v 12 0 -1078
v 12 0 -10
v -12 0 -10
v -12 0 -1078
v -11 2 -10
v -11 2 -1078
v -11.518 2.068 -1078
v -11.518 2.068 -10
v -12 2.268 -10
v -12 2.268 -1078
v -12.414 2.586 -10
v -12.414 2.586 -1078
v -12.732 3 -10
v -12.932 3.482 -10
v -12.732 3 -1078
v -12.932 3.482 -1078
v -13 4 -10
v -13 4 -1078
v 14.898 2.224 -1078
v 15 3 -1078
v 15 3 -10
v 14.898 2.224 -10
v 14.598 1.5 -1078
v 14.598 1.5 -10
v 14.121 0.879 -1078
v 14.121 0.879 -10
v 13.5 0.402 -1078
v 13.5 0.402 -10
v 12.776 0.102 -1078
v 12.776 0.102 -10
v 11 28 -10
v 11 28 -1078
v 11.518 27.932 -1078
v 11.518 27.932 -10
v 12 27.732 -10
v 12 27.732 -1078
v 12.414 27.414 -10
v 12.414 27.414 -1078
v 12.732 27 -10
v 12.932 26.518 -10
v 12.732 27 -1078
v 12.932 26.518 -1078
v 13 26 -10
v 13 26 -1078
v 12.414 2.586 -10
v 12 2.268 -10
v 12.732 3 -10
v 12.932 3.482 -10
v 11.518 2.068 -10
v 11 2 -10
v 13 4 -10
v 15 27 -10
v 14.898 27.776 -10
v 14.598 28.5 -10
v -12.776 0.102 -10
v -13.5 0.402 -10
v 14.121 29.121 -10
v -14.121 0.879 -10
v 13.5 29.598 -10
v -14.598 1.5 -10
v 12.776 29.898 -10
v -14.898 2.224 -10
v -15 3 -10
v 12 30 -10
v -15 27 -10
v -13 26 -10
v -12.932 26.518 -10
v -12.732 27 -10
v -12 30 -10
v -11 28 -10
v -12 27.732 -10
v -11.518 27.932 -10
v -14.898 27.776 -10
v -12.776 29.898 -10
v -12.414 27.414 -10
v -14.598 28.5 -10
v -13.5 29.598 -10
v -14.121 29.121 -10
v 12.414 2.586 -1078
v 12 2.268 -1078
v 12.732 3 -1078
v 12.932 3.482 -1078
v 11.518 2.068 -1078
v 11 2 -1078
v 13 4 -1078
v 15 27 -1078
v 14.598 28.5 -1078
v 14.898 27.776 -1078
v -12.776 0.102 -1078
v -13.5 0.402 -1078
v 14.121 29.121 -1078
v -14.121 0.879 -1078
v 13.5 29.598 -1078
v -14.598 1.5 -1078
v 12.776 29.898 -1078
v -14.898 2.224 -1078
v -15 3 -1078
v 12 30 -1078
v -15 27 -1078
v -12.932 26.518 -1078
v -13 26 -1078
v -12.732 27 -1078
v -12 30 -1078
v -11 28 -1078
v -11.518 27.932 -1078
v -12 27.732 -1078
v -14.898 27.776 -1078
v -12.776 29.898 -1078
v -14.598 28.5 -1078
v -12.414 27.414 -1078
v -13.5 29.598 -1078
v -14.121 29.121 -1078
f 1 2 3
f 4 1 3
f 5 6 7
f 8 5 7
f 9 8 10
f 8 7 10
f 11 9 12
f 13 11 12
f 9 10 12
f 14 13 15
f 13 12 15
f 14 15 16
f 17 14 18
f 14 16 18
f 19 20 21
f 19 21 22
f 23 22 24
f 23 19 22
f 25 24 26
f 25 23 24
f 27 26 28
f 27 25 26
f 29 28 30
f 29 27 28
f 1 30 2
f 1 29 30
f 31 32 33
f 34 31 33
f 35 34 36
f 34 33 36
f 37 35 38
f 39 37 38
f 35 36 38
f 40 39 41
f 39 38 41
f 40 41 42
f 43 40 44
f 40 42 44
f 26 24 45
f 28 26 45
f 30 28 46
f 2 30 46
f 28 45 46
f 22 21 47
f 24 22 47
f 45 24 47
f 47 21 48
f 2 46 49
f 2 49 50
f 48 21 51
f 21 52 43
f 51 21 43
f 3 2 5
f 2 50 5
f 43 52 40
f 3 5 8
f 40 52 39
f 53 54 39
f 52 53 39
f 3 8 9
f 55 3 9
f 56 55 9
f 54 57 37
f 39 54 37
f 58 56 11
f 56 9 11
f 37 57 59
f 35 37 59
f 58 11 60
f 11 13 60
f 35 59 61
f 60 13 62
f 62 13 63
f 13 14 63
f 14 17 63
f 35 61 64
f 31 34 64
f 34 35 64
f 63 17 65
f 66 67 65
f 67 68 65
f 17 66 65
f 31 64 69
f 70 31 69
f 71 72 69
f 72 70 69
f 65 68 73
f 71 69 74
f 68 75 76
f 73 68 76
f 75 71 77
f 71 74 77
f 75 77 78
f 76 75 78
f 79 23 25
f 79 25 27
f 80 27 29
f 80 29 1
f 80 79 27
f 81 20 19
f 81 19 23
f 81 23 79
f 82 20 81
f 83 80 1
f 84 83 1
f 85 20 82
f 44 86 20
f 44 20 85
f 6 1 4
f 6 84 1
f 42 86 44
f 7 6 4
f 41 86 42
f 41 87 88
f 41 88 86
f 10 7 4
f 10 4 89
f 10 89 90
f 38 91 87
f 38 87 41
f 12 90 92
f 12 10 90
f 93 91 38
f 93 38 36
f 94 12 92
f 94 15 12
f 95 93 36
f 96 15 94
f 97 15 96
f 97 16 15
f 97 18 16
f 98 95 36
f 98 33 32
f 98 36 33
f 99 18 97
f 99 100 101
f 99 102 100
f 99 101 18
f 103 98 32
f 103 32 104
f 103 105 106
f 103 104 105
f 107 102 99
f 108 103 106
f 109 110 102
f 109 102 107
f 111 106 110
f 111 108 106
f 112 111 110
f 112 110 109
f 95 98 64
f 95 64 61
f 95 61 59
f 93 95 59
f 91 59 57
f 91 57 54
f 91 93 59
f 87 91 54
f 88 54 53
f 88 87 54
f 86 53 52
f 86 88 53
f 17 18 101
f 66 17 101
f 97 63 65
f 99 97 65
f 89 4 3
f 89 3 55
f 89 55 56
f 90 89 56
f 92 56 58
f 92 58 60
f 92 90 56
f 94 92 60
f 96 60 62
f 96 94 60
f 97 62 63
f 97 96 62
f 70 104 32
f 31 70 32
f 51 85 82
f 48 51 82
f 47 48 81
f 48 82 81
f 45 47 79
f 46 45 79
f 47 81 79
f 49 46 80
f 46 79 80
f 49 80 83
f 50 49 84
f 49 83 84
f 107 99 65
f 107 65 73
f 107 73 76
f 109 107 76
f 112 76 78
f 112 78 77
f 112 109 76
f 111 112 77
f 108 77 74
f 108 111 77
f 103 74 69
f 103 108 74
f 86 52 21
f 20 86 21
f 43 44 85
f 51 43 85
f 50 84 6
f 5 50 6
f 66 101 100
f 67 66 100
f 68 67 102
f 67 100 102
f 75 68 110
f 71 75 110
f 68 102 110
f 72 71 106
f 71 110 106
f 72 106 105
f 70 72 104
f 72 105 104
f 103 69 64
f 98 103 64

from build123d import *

# Parameters (mm, degrees)
EXTRUDE_1_DEPTH = 534


with BuildPart() as part:
    # Эскиз1 → Бобышка-Вытянуть1 (new body)
    with BuildSketch(Plane.XY.offset(-10)):
        with BuildLine():
            Line((12, 0), (-12, 0))
            ThreePointArc((-12, 0), (-14.121320344, 0.878679656), (-15, 3))
            Line((-15, 3), (-15, 27))
            ThreePointArc((-15, 27), (-14.121320344, 29.121320344), (-12, 30))
            Line((-12, 30), (12, 30))
            ThreePointArc((12, 30), (14.121320344, 29.121320344), (15, 27))
            Line((15, 27), (15, 3))
            ThreePointArc((15, 3), (14.121320344, 0.878679656), (12, 0))
        make_face()
        with BuildLine():
            Line((11, 2), (-11, 2))
            ThreePointArc((-11, 2), (-12.414213562, 2.585786438), (-13, 4))
            Line((-13, 4), (-13, 26))
            ThreePointArc((-13, 26), (-12.414213562, 27.414213562), (-11, 28))
            Line((-11, 28), (11, 28))
            ThreePointArc((11, 28), (12.414213562, 27.414213562), (13, 26))
            Line((13, 26), (13, 4))
            ThreePointArc((13, 4), (12.414213562, 2.585786438), (11, 2))
        make_face(mode=Mode.SUBTRACT)
    extrude(amount=-EXTRUDE_1_DEPTH)

    # Зеркальное отражение1: part across plane


with BuildPart() as part_1:
    add(part.part)
    add(part.part.mirror(Plane(origin=(695.566765073, 158.190477347, -544), x_dir=(1, 0, 0), z_dir=(0, 0, 1))))


solid = part_1.part
